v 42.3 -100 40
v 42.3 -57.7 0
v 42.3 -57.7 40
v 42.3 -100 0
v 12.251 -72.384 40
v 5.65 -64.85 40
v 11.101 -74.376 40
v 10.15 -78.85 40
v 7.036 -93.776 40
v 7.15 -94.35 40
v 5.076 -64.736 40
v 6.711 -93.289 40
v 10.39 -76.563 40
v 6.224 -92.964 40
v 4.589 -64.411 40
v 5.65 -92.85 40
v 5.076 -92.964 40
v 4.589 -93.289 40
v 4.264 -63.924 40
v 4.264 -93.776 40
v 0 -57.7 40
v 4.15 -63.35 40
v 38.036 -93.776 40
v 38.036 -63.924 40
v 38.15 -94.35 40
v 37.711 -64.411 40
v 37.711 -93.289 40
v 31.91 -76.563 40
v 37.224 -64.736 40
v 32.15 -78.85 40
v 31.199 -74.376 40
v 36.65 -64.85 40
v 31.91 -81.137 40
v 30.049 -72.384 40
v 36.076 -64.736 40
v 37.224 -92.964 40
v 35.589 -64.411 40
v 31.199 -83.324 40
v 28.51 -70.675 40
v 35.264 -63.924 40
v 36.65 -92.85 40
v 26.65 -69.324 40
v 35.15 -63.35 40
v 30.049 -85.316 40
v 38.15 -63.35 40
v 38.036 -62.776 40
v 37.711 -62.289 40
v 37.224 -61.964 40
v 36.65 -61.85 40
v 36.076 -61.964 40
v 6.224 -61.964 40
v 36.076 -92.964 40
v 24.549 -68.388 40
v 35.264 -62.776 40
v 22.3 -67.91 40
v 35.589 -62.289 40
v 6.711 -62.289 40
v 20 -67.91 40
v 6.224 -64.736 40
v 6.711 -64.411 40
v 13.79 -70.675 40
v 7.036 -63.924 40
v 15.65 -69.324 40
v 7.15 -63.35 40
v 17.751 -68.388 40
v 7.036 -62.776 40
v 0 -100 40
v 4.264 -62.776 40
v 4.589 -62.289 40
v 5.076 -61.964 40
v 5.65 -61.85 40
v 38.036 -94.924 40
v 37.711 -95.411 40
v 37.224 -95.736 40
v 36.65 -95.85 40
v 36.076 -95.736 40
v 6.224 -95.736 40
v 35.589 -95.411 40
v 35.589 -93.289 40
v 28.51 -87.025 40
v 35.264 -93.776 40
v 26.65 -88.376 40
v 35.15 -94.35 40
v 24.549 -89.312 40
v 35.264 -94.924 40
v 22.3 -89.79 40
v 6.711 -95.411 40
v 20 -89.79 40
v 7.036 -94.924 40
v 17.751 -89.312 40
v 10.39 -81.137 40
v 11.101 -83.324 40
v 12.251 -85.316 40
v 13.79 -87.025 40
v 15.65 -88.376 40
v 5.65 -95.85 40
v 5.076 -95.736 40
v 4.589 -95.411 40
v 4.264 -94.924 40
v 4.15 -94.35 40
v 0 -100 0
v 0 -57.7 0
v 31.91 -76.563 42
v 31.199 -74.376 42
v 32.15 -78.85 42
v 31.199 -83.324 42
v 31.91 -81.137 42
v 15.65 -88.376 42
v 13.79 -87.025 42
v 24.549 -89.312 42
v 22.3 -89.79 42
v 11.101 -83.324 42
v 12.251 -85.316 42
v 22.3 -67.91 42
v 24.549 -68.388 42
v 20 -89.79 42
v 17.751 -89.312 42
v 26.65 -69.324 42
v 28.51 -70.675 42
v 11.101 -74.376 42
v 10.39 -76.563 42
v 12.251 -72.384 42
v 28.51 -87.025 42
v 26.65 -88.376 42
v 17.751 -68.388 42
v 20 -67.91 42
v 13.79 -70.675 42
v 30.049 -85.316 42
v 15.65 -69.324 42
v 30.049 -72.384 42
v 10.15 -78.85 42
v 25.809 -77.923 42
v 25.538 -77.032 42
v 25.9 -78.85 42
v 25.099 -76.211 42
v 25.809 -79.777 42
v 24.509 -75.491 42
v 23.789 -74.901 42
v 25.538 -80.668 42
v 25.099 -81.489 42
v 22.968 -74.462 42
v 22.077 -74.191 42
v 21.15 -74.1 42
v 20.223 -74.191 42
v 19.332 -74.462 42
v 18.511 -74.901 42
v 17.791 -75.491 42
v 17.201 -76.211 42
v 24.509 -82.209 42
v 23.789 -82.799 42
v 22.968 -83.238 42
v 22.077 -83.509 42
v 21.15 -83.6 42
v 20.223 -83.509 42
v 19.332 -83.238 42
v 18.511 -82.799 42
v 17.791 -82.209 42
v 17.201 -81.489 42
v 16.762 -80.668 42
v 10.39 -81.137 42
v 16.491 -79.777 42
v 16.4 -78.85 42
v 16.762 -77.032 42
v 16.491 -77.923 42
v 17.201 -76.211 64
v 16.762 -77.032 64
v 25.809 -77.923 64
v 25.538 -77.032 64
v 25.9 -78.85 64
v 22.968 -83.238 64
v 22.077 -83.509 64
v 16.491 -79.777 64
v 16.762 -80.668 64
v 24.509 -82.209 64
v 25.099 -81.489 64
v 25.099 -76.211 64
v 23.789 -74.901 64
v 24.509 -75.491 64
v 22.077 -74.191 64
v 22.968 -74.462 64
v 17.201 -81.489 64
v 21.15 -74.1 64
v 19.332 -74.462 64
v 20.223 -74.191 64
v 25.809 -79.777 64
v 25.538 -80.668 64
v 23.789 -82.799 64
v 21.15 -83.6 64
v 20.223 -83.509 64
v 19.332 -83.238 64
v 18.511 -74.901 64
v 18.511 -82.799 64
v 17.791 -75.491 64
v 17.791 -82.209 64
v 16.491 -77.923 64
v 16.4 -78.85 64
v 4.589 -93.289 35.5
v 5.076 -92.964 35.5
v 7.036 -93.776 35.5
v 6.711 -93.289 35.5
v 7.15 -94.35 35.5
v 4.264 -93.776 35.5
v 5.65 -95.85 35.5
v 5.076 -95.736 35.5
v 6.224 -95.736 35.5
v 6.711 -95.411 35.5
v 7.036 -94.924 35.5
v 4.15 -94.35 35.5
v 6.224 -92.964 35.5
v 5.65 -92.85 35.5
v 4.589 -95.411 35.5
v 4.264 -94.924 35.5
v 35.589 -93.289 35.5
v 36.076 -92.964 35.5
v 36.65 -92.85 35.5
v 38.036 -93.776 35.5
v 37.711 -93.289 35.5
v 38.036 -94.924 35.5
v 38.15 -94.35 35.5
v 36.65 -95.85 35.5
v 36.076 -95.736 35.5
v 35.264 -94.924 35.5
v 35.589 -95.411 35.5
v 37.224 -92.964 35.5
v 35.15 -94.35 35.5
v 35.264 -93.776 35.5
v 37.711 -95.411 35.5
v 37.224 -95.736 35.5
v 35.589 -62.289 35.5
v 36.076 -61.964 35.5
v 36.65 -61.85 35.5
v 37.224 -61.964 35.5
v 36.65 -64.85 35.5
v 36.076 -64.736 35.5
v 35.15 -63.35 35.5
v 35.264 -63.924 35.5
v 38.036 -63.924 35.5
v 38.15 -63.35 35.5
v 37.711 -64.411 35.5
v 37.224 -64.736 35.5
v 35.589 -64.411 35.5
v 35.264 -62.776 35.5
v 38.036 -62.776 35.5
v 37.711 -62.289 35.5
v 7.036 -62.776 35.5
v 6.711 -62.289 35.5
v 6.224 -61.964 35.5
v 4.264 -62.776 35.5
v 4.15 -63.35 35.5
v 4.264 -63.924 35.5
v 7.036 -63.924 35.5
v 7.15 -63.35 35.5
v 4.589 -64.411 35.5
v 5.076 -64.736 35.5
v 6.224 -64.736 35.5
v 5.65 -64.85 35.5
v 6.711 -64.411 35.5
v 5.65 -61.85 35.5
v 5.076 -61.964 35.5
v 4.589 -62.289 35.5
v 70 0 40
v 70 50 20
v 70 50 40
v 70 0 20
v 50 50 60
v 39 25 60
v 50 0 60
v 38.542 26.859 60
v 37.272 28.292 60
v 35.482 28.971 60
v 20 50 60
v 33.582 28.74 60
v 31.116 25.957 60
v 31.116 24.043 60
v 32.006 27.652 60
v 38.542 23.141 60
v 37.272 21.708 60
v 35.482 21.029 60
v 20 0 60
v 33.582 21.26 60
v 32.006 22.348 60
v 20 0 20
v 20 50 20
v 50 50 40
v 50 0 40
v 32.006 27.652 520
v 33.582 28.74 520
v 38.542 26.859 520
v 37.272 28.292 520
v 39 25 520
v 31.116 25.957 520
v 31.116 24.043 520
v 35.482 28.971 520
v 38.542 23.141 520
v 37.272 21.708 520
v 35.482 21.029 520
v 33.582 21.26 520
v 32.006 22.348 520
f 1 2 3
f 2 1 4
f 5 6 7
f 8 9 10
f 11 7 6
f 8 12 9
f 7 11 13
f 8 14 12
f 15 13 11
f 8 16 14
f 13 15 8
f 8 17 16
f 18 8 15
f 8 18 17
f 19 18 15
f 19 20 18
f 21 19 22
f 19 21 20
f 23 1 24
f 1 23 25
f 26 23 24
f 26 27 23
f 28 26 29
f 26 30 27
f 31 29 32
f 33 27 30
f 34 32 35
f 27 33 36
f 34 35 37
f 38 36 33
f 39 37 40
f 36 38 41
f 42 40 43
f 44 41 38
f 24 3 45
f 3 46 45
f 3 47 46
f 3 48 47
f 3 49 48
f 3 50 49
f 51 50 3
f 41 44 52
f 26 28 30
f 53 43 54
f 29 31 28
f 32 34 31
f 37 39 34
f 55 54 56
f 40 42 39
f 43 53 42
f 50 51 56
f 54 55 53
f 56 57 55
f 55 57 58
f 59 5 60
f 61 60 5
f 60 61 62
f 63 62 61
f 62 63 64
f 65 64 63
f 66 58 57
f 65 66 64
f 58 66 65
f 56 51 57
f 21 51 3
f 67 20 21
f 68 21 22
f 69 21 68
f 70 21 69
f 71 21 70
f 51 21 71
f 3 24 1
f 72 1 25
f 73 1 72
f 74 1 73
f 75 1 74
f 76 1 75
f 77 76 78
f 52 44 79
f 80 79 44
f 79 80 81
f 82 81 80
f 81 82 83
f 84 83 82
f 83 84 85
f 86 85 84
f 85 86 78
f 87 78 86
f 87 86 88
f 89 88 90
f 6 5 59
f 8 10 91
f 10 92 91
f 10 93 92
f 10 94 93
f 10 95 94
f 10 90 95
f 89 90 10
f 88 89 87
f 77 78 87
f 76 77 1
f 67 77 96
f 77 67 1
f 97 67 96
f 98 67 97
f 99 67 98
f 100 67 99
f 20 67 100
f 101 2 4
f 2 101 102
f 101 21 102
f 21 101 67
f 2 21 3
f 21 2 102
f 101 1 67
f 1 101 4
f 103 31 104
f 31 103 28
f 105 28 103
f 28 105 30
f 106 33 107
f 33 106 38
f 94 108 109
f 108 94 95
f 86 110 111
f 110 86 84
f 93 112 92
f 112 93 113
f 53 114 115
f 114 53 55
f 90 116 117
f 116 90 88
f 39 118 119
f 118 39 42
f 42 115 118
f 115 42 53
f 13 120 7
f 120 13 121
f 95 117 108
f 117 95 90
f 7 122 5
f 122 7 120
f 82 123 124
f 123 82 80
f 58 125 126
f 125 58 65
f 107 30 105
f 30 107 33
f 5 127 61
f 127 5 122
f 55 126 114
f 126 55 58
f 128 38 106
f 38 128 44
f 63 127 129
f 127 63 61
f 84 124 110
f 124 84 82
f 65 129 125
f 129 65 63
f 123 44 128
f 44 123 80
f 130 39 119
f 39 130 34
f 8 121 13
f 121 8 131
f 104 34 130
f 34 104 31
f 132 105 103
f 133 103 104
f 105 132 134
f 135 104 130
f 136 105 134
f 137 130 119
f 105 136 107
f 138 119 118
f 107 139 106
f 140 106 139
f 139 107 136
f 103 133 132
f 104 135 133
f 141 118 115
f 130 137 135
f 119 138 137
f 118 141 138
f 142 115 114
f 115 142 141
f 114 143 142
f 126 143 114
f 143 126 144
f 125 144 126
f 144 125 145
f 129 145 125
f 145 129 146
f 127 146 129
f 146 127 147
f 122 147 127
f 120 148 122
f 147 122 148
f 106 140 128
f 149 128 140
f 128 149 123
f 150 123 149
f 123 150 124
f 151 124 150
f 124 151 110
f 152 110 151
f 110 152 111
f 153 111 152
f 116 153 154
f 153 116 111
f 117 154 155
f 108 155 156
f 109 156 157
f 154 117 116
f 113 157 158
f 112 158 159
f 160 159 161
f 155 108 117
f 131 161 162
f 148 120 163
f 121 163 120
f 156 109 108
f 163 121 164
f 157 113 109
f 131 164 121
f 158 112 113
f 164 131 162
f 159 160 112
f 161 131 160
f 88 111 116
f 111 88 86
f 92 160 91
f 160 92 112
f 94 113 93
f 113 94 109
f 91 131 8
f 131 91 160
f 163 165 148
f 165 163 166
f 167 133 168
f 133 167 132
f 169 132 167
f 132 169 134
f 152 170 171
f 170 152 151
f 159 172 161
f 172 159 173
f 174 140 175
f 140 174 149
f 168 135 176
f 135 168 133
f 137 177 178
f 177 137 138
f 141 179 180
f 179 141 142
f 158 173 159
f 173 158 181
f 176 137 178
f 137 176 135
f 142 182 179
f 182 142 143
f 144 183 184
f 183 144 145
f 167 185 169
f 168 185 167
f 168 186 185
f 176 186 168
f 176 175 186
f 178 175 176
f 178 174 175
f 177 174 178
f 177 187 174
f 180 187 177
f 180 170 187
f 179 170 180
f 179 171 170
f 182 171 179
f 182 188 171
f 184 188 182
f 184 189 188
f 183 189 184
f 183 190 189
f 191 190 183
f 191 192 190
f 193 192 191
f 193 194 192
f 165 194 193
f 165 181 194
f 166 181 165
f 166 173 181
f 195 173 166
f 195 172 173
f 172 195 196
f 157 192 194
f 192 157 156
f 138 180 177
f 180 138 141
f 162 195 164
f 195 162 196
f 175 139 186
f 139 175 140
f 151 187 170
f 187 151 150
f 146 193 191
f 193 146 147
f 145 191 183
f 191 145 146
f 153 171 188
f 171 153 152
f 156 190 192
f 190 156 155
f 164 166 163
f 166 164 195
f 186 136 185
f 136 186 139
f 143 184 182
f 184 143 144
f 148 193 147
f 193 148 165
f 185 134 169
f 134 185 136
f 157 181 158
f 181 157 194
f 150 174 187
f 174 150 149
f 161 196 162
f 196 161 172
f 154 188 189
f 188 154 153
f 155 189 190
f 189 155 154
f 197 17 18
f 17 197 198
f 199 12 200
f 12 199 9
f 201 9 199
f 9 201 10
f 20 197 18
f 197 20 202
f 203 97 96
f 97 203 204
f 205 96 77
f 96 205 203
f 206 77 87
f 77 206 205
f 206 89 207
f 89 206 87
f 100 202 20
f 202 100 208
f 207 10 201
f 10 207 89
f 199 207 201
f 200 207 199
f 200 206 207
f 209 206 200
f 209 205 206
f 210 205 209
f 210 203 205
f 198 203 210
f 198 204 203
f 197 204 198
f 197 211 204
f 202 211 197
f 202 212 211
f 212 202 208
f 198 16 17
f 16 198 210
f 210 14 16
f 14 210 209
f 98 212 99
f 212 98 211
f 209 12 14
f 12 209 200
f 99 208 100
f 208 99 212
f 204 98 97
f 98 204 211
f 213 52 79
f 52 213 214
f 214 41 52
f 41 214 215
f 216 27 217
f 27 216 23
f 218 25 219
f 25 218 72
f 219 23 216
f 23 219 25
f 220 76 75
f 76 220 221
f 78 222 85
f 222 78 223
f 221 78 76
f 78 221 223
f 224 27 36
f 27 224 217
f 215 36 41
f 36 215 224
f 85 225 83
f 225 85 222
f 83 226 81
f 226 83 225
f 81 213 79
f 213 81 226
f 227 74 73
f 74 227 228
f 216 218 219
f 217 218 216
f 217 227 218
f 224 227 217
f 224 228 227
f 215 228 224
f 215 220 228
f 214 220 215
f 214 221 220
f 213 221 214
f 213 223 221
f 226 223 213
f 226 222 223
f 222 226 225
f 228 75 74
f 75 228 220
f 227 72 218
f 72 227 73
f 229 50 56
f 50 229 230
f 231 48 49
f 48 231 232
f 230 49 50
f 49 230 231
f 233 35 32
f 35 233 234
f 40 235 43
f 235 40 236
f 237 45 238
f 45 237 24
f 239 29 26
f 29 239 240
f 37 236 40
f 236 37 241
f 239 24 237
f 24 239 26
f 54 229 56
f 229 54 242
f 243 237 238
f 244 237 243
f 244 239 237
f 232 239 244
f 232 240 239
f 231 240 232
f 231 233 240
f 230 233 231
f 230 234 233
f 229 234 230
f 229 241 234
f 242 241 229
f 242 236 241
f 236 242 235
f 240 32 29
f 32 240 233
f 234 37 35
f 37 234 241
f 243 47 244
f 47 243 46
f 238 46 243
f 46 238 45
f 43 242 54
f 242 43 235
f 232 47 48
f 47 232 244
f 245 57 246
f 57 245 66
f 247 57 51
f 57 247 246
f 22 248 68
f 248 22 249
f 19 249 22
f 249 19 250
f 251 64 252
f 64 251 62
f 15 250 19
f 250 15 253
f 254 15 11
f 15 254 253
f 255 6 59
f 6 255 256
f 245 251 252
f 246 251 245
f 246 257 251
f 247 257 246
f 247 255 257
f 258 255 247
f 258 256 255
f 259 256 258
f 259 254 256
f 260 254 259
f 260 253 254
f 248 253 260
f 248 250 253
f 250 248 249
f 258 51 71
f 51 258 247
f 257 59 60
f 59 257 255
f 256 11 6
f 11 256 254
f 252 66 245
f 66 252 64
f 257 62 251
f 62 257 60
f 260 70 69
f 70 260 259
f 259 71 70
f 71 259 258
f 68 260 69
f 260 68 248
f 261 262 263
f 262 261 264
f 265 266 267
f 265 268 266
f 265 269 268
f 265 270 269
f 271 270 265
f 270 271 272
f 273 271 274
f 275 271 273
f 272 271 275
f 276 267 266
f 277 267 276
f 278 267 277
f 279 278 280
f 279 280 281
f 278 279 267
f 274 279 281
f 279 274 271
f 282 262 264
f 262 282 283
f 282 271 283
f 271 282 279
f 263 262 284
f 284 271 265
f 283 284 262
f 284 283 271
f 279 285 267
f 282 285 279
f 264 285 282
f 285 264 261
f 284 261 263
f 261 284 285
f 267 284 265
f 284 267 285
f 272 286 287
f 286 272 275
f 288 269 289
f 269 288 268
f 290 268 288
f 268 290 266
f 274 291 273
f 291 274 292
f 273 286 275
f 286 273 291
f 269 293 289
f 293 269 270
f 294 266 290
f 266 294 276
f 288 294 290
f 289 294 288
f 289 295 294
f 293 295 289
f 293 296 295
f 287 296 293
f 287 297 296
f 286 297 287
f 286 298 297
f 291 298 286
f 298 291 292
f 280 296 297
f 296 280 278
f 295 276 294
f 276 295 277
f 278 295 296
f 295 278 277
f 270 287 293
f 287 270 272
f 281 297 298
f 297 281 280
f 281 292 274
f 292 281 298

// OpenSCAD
module stepper_nema17(length = 40, size = 42.3, diameter = 9.5, center=[0.5, 0.5, 0]) {
	color("green") render() translate([size*center[0], size*center[1], length*center[2]]) difference() {
		union() {
			translate([-size/2, -size/2, 0]) cube([size, size, length]);
			cylinder(d=22, h=length+2);
			cylinder(d=diameter, h=length+24, $fn=32);
		}
		
		for (r = [0:90:360]) {
			rotate([0, 0, r]) translate([-31/2, -31/2, length-4.5]) cylinder(d=3, h=4.5, $fn=16);
		}
	}
}

module idler_nema17(length = 40, size = 42.3, diameter = 9.5, thickness = 1.5, center=[0.5, 0.5, 0]) {
	render() translate([size*center[0], size*center[1], length*center[2]]) difference() {
		union() {
			//translate([-size/2, -size/2, 0]) cube([size, size, length]);
			cylinder(d=diameter, h=length+24, $fn=32);
			translate([-diameter-thickness, 0, 0]) cylinder(d=diameter, h=length+24, $fn=32);
		}
	}
}

module idler_x(length = 40, diameter = 9.5, thickness = 1.5) {
	offset = diameter+thickness;
	
	translate([offset, -20, 0]) cylinder(d=diameter, h=length+24, $fn=32);
	translate([offset, 20, 0]) cylinder(d=diameter, h=length+24, $fn=32);
}

module idler_z(length = 40, size = 50, overlap = 20, rod = [8, 500], center=[0.5, 0.5, 0]) {
	render() translate([size*center[0]+overlap, size*center[1], length*center[2]+overlap]) {
		translate([-size/2, -size/2, 0]) {
			difference () {
				cube([size, size, length]);
				translate([size-overlap, 0, overlap]) cube([overlap, size, length-overlap]);
			}
			
			rod_inset = (size - overlap) / 2;
			translate([rod_inset, size/2, 0]) cylinder(d=rod[0], h=rod[1]);
		}
	}
}

translate([0, -100, 0]) stepper_nema17();

idler_z();
